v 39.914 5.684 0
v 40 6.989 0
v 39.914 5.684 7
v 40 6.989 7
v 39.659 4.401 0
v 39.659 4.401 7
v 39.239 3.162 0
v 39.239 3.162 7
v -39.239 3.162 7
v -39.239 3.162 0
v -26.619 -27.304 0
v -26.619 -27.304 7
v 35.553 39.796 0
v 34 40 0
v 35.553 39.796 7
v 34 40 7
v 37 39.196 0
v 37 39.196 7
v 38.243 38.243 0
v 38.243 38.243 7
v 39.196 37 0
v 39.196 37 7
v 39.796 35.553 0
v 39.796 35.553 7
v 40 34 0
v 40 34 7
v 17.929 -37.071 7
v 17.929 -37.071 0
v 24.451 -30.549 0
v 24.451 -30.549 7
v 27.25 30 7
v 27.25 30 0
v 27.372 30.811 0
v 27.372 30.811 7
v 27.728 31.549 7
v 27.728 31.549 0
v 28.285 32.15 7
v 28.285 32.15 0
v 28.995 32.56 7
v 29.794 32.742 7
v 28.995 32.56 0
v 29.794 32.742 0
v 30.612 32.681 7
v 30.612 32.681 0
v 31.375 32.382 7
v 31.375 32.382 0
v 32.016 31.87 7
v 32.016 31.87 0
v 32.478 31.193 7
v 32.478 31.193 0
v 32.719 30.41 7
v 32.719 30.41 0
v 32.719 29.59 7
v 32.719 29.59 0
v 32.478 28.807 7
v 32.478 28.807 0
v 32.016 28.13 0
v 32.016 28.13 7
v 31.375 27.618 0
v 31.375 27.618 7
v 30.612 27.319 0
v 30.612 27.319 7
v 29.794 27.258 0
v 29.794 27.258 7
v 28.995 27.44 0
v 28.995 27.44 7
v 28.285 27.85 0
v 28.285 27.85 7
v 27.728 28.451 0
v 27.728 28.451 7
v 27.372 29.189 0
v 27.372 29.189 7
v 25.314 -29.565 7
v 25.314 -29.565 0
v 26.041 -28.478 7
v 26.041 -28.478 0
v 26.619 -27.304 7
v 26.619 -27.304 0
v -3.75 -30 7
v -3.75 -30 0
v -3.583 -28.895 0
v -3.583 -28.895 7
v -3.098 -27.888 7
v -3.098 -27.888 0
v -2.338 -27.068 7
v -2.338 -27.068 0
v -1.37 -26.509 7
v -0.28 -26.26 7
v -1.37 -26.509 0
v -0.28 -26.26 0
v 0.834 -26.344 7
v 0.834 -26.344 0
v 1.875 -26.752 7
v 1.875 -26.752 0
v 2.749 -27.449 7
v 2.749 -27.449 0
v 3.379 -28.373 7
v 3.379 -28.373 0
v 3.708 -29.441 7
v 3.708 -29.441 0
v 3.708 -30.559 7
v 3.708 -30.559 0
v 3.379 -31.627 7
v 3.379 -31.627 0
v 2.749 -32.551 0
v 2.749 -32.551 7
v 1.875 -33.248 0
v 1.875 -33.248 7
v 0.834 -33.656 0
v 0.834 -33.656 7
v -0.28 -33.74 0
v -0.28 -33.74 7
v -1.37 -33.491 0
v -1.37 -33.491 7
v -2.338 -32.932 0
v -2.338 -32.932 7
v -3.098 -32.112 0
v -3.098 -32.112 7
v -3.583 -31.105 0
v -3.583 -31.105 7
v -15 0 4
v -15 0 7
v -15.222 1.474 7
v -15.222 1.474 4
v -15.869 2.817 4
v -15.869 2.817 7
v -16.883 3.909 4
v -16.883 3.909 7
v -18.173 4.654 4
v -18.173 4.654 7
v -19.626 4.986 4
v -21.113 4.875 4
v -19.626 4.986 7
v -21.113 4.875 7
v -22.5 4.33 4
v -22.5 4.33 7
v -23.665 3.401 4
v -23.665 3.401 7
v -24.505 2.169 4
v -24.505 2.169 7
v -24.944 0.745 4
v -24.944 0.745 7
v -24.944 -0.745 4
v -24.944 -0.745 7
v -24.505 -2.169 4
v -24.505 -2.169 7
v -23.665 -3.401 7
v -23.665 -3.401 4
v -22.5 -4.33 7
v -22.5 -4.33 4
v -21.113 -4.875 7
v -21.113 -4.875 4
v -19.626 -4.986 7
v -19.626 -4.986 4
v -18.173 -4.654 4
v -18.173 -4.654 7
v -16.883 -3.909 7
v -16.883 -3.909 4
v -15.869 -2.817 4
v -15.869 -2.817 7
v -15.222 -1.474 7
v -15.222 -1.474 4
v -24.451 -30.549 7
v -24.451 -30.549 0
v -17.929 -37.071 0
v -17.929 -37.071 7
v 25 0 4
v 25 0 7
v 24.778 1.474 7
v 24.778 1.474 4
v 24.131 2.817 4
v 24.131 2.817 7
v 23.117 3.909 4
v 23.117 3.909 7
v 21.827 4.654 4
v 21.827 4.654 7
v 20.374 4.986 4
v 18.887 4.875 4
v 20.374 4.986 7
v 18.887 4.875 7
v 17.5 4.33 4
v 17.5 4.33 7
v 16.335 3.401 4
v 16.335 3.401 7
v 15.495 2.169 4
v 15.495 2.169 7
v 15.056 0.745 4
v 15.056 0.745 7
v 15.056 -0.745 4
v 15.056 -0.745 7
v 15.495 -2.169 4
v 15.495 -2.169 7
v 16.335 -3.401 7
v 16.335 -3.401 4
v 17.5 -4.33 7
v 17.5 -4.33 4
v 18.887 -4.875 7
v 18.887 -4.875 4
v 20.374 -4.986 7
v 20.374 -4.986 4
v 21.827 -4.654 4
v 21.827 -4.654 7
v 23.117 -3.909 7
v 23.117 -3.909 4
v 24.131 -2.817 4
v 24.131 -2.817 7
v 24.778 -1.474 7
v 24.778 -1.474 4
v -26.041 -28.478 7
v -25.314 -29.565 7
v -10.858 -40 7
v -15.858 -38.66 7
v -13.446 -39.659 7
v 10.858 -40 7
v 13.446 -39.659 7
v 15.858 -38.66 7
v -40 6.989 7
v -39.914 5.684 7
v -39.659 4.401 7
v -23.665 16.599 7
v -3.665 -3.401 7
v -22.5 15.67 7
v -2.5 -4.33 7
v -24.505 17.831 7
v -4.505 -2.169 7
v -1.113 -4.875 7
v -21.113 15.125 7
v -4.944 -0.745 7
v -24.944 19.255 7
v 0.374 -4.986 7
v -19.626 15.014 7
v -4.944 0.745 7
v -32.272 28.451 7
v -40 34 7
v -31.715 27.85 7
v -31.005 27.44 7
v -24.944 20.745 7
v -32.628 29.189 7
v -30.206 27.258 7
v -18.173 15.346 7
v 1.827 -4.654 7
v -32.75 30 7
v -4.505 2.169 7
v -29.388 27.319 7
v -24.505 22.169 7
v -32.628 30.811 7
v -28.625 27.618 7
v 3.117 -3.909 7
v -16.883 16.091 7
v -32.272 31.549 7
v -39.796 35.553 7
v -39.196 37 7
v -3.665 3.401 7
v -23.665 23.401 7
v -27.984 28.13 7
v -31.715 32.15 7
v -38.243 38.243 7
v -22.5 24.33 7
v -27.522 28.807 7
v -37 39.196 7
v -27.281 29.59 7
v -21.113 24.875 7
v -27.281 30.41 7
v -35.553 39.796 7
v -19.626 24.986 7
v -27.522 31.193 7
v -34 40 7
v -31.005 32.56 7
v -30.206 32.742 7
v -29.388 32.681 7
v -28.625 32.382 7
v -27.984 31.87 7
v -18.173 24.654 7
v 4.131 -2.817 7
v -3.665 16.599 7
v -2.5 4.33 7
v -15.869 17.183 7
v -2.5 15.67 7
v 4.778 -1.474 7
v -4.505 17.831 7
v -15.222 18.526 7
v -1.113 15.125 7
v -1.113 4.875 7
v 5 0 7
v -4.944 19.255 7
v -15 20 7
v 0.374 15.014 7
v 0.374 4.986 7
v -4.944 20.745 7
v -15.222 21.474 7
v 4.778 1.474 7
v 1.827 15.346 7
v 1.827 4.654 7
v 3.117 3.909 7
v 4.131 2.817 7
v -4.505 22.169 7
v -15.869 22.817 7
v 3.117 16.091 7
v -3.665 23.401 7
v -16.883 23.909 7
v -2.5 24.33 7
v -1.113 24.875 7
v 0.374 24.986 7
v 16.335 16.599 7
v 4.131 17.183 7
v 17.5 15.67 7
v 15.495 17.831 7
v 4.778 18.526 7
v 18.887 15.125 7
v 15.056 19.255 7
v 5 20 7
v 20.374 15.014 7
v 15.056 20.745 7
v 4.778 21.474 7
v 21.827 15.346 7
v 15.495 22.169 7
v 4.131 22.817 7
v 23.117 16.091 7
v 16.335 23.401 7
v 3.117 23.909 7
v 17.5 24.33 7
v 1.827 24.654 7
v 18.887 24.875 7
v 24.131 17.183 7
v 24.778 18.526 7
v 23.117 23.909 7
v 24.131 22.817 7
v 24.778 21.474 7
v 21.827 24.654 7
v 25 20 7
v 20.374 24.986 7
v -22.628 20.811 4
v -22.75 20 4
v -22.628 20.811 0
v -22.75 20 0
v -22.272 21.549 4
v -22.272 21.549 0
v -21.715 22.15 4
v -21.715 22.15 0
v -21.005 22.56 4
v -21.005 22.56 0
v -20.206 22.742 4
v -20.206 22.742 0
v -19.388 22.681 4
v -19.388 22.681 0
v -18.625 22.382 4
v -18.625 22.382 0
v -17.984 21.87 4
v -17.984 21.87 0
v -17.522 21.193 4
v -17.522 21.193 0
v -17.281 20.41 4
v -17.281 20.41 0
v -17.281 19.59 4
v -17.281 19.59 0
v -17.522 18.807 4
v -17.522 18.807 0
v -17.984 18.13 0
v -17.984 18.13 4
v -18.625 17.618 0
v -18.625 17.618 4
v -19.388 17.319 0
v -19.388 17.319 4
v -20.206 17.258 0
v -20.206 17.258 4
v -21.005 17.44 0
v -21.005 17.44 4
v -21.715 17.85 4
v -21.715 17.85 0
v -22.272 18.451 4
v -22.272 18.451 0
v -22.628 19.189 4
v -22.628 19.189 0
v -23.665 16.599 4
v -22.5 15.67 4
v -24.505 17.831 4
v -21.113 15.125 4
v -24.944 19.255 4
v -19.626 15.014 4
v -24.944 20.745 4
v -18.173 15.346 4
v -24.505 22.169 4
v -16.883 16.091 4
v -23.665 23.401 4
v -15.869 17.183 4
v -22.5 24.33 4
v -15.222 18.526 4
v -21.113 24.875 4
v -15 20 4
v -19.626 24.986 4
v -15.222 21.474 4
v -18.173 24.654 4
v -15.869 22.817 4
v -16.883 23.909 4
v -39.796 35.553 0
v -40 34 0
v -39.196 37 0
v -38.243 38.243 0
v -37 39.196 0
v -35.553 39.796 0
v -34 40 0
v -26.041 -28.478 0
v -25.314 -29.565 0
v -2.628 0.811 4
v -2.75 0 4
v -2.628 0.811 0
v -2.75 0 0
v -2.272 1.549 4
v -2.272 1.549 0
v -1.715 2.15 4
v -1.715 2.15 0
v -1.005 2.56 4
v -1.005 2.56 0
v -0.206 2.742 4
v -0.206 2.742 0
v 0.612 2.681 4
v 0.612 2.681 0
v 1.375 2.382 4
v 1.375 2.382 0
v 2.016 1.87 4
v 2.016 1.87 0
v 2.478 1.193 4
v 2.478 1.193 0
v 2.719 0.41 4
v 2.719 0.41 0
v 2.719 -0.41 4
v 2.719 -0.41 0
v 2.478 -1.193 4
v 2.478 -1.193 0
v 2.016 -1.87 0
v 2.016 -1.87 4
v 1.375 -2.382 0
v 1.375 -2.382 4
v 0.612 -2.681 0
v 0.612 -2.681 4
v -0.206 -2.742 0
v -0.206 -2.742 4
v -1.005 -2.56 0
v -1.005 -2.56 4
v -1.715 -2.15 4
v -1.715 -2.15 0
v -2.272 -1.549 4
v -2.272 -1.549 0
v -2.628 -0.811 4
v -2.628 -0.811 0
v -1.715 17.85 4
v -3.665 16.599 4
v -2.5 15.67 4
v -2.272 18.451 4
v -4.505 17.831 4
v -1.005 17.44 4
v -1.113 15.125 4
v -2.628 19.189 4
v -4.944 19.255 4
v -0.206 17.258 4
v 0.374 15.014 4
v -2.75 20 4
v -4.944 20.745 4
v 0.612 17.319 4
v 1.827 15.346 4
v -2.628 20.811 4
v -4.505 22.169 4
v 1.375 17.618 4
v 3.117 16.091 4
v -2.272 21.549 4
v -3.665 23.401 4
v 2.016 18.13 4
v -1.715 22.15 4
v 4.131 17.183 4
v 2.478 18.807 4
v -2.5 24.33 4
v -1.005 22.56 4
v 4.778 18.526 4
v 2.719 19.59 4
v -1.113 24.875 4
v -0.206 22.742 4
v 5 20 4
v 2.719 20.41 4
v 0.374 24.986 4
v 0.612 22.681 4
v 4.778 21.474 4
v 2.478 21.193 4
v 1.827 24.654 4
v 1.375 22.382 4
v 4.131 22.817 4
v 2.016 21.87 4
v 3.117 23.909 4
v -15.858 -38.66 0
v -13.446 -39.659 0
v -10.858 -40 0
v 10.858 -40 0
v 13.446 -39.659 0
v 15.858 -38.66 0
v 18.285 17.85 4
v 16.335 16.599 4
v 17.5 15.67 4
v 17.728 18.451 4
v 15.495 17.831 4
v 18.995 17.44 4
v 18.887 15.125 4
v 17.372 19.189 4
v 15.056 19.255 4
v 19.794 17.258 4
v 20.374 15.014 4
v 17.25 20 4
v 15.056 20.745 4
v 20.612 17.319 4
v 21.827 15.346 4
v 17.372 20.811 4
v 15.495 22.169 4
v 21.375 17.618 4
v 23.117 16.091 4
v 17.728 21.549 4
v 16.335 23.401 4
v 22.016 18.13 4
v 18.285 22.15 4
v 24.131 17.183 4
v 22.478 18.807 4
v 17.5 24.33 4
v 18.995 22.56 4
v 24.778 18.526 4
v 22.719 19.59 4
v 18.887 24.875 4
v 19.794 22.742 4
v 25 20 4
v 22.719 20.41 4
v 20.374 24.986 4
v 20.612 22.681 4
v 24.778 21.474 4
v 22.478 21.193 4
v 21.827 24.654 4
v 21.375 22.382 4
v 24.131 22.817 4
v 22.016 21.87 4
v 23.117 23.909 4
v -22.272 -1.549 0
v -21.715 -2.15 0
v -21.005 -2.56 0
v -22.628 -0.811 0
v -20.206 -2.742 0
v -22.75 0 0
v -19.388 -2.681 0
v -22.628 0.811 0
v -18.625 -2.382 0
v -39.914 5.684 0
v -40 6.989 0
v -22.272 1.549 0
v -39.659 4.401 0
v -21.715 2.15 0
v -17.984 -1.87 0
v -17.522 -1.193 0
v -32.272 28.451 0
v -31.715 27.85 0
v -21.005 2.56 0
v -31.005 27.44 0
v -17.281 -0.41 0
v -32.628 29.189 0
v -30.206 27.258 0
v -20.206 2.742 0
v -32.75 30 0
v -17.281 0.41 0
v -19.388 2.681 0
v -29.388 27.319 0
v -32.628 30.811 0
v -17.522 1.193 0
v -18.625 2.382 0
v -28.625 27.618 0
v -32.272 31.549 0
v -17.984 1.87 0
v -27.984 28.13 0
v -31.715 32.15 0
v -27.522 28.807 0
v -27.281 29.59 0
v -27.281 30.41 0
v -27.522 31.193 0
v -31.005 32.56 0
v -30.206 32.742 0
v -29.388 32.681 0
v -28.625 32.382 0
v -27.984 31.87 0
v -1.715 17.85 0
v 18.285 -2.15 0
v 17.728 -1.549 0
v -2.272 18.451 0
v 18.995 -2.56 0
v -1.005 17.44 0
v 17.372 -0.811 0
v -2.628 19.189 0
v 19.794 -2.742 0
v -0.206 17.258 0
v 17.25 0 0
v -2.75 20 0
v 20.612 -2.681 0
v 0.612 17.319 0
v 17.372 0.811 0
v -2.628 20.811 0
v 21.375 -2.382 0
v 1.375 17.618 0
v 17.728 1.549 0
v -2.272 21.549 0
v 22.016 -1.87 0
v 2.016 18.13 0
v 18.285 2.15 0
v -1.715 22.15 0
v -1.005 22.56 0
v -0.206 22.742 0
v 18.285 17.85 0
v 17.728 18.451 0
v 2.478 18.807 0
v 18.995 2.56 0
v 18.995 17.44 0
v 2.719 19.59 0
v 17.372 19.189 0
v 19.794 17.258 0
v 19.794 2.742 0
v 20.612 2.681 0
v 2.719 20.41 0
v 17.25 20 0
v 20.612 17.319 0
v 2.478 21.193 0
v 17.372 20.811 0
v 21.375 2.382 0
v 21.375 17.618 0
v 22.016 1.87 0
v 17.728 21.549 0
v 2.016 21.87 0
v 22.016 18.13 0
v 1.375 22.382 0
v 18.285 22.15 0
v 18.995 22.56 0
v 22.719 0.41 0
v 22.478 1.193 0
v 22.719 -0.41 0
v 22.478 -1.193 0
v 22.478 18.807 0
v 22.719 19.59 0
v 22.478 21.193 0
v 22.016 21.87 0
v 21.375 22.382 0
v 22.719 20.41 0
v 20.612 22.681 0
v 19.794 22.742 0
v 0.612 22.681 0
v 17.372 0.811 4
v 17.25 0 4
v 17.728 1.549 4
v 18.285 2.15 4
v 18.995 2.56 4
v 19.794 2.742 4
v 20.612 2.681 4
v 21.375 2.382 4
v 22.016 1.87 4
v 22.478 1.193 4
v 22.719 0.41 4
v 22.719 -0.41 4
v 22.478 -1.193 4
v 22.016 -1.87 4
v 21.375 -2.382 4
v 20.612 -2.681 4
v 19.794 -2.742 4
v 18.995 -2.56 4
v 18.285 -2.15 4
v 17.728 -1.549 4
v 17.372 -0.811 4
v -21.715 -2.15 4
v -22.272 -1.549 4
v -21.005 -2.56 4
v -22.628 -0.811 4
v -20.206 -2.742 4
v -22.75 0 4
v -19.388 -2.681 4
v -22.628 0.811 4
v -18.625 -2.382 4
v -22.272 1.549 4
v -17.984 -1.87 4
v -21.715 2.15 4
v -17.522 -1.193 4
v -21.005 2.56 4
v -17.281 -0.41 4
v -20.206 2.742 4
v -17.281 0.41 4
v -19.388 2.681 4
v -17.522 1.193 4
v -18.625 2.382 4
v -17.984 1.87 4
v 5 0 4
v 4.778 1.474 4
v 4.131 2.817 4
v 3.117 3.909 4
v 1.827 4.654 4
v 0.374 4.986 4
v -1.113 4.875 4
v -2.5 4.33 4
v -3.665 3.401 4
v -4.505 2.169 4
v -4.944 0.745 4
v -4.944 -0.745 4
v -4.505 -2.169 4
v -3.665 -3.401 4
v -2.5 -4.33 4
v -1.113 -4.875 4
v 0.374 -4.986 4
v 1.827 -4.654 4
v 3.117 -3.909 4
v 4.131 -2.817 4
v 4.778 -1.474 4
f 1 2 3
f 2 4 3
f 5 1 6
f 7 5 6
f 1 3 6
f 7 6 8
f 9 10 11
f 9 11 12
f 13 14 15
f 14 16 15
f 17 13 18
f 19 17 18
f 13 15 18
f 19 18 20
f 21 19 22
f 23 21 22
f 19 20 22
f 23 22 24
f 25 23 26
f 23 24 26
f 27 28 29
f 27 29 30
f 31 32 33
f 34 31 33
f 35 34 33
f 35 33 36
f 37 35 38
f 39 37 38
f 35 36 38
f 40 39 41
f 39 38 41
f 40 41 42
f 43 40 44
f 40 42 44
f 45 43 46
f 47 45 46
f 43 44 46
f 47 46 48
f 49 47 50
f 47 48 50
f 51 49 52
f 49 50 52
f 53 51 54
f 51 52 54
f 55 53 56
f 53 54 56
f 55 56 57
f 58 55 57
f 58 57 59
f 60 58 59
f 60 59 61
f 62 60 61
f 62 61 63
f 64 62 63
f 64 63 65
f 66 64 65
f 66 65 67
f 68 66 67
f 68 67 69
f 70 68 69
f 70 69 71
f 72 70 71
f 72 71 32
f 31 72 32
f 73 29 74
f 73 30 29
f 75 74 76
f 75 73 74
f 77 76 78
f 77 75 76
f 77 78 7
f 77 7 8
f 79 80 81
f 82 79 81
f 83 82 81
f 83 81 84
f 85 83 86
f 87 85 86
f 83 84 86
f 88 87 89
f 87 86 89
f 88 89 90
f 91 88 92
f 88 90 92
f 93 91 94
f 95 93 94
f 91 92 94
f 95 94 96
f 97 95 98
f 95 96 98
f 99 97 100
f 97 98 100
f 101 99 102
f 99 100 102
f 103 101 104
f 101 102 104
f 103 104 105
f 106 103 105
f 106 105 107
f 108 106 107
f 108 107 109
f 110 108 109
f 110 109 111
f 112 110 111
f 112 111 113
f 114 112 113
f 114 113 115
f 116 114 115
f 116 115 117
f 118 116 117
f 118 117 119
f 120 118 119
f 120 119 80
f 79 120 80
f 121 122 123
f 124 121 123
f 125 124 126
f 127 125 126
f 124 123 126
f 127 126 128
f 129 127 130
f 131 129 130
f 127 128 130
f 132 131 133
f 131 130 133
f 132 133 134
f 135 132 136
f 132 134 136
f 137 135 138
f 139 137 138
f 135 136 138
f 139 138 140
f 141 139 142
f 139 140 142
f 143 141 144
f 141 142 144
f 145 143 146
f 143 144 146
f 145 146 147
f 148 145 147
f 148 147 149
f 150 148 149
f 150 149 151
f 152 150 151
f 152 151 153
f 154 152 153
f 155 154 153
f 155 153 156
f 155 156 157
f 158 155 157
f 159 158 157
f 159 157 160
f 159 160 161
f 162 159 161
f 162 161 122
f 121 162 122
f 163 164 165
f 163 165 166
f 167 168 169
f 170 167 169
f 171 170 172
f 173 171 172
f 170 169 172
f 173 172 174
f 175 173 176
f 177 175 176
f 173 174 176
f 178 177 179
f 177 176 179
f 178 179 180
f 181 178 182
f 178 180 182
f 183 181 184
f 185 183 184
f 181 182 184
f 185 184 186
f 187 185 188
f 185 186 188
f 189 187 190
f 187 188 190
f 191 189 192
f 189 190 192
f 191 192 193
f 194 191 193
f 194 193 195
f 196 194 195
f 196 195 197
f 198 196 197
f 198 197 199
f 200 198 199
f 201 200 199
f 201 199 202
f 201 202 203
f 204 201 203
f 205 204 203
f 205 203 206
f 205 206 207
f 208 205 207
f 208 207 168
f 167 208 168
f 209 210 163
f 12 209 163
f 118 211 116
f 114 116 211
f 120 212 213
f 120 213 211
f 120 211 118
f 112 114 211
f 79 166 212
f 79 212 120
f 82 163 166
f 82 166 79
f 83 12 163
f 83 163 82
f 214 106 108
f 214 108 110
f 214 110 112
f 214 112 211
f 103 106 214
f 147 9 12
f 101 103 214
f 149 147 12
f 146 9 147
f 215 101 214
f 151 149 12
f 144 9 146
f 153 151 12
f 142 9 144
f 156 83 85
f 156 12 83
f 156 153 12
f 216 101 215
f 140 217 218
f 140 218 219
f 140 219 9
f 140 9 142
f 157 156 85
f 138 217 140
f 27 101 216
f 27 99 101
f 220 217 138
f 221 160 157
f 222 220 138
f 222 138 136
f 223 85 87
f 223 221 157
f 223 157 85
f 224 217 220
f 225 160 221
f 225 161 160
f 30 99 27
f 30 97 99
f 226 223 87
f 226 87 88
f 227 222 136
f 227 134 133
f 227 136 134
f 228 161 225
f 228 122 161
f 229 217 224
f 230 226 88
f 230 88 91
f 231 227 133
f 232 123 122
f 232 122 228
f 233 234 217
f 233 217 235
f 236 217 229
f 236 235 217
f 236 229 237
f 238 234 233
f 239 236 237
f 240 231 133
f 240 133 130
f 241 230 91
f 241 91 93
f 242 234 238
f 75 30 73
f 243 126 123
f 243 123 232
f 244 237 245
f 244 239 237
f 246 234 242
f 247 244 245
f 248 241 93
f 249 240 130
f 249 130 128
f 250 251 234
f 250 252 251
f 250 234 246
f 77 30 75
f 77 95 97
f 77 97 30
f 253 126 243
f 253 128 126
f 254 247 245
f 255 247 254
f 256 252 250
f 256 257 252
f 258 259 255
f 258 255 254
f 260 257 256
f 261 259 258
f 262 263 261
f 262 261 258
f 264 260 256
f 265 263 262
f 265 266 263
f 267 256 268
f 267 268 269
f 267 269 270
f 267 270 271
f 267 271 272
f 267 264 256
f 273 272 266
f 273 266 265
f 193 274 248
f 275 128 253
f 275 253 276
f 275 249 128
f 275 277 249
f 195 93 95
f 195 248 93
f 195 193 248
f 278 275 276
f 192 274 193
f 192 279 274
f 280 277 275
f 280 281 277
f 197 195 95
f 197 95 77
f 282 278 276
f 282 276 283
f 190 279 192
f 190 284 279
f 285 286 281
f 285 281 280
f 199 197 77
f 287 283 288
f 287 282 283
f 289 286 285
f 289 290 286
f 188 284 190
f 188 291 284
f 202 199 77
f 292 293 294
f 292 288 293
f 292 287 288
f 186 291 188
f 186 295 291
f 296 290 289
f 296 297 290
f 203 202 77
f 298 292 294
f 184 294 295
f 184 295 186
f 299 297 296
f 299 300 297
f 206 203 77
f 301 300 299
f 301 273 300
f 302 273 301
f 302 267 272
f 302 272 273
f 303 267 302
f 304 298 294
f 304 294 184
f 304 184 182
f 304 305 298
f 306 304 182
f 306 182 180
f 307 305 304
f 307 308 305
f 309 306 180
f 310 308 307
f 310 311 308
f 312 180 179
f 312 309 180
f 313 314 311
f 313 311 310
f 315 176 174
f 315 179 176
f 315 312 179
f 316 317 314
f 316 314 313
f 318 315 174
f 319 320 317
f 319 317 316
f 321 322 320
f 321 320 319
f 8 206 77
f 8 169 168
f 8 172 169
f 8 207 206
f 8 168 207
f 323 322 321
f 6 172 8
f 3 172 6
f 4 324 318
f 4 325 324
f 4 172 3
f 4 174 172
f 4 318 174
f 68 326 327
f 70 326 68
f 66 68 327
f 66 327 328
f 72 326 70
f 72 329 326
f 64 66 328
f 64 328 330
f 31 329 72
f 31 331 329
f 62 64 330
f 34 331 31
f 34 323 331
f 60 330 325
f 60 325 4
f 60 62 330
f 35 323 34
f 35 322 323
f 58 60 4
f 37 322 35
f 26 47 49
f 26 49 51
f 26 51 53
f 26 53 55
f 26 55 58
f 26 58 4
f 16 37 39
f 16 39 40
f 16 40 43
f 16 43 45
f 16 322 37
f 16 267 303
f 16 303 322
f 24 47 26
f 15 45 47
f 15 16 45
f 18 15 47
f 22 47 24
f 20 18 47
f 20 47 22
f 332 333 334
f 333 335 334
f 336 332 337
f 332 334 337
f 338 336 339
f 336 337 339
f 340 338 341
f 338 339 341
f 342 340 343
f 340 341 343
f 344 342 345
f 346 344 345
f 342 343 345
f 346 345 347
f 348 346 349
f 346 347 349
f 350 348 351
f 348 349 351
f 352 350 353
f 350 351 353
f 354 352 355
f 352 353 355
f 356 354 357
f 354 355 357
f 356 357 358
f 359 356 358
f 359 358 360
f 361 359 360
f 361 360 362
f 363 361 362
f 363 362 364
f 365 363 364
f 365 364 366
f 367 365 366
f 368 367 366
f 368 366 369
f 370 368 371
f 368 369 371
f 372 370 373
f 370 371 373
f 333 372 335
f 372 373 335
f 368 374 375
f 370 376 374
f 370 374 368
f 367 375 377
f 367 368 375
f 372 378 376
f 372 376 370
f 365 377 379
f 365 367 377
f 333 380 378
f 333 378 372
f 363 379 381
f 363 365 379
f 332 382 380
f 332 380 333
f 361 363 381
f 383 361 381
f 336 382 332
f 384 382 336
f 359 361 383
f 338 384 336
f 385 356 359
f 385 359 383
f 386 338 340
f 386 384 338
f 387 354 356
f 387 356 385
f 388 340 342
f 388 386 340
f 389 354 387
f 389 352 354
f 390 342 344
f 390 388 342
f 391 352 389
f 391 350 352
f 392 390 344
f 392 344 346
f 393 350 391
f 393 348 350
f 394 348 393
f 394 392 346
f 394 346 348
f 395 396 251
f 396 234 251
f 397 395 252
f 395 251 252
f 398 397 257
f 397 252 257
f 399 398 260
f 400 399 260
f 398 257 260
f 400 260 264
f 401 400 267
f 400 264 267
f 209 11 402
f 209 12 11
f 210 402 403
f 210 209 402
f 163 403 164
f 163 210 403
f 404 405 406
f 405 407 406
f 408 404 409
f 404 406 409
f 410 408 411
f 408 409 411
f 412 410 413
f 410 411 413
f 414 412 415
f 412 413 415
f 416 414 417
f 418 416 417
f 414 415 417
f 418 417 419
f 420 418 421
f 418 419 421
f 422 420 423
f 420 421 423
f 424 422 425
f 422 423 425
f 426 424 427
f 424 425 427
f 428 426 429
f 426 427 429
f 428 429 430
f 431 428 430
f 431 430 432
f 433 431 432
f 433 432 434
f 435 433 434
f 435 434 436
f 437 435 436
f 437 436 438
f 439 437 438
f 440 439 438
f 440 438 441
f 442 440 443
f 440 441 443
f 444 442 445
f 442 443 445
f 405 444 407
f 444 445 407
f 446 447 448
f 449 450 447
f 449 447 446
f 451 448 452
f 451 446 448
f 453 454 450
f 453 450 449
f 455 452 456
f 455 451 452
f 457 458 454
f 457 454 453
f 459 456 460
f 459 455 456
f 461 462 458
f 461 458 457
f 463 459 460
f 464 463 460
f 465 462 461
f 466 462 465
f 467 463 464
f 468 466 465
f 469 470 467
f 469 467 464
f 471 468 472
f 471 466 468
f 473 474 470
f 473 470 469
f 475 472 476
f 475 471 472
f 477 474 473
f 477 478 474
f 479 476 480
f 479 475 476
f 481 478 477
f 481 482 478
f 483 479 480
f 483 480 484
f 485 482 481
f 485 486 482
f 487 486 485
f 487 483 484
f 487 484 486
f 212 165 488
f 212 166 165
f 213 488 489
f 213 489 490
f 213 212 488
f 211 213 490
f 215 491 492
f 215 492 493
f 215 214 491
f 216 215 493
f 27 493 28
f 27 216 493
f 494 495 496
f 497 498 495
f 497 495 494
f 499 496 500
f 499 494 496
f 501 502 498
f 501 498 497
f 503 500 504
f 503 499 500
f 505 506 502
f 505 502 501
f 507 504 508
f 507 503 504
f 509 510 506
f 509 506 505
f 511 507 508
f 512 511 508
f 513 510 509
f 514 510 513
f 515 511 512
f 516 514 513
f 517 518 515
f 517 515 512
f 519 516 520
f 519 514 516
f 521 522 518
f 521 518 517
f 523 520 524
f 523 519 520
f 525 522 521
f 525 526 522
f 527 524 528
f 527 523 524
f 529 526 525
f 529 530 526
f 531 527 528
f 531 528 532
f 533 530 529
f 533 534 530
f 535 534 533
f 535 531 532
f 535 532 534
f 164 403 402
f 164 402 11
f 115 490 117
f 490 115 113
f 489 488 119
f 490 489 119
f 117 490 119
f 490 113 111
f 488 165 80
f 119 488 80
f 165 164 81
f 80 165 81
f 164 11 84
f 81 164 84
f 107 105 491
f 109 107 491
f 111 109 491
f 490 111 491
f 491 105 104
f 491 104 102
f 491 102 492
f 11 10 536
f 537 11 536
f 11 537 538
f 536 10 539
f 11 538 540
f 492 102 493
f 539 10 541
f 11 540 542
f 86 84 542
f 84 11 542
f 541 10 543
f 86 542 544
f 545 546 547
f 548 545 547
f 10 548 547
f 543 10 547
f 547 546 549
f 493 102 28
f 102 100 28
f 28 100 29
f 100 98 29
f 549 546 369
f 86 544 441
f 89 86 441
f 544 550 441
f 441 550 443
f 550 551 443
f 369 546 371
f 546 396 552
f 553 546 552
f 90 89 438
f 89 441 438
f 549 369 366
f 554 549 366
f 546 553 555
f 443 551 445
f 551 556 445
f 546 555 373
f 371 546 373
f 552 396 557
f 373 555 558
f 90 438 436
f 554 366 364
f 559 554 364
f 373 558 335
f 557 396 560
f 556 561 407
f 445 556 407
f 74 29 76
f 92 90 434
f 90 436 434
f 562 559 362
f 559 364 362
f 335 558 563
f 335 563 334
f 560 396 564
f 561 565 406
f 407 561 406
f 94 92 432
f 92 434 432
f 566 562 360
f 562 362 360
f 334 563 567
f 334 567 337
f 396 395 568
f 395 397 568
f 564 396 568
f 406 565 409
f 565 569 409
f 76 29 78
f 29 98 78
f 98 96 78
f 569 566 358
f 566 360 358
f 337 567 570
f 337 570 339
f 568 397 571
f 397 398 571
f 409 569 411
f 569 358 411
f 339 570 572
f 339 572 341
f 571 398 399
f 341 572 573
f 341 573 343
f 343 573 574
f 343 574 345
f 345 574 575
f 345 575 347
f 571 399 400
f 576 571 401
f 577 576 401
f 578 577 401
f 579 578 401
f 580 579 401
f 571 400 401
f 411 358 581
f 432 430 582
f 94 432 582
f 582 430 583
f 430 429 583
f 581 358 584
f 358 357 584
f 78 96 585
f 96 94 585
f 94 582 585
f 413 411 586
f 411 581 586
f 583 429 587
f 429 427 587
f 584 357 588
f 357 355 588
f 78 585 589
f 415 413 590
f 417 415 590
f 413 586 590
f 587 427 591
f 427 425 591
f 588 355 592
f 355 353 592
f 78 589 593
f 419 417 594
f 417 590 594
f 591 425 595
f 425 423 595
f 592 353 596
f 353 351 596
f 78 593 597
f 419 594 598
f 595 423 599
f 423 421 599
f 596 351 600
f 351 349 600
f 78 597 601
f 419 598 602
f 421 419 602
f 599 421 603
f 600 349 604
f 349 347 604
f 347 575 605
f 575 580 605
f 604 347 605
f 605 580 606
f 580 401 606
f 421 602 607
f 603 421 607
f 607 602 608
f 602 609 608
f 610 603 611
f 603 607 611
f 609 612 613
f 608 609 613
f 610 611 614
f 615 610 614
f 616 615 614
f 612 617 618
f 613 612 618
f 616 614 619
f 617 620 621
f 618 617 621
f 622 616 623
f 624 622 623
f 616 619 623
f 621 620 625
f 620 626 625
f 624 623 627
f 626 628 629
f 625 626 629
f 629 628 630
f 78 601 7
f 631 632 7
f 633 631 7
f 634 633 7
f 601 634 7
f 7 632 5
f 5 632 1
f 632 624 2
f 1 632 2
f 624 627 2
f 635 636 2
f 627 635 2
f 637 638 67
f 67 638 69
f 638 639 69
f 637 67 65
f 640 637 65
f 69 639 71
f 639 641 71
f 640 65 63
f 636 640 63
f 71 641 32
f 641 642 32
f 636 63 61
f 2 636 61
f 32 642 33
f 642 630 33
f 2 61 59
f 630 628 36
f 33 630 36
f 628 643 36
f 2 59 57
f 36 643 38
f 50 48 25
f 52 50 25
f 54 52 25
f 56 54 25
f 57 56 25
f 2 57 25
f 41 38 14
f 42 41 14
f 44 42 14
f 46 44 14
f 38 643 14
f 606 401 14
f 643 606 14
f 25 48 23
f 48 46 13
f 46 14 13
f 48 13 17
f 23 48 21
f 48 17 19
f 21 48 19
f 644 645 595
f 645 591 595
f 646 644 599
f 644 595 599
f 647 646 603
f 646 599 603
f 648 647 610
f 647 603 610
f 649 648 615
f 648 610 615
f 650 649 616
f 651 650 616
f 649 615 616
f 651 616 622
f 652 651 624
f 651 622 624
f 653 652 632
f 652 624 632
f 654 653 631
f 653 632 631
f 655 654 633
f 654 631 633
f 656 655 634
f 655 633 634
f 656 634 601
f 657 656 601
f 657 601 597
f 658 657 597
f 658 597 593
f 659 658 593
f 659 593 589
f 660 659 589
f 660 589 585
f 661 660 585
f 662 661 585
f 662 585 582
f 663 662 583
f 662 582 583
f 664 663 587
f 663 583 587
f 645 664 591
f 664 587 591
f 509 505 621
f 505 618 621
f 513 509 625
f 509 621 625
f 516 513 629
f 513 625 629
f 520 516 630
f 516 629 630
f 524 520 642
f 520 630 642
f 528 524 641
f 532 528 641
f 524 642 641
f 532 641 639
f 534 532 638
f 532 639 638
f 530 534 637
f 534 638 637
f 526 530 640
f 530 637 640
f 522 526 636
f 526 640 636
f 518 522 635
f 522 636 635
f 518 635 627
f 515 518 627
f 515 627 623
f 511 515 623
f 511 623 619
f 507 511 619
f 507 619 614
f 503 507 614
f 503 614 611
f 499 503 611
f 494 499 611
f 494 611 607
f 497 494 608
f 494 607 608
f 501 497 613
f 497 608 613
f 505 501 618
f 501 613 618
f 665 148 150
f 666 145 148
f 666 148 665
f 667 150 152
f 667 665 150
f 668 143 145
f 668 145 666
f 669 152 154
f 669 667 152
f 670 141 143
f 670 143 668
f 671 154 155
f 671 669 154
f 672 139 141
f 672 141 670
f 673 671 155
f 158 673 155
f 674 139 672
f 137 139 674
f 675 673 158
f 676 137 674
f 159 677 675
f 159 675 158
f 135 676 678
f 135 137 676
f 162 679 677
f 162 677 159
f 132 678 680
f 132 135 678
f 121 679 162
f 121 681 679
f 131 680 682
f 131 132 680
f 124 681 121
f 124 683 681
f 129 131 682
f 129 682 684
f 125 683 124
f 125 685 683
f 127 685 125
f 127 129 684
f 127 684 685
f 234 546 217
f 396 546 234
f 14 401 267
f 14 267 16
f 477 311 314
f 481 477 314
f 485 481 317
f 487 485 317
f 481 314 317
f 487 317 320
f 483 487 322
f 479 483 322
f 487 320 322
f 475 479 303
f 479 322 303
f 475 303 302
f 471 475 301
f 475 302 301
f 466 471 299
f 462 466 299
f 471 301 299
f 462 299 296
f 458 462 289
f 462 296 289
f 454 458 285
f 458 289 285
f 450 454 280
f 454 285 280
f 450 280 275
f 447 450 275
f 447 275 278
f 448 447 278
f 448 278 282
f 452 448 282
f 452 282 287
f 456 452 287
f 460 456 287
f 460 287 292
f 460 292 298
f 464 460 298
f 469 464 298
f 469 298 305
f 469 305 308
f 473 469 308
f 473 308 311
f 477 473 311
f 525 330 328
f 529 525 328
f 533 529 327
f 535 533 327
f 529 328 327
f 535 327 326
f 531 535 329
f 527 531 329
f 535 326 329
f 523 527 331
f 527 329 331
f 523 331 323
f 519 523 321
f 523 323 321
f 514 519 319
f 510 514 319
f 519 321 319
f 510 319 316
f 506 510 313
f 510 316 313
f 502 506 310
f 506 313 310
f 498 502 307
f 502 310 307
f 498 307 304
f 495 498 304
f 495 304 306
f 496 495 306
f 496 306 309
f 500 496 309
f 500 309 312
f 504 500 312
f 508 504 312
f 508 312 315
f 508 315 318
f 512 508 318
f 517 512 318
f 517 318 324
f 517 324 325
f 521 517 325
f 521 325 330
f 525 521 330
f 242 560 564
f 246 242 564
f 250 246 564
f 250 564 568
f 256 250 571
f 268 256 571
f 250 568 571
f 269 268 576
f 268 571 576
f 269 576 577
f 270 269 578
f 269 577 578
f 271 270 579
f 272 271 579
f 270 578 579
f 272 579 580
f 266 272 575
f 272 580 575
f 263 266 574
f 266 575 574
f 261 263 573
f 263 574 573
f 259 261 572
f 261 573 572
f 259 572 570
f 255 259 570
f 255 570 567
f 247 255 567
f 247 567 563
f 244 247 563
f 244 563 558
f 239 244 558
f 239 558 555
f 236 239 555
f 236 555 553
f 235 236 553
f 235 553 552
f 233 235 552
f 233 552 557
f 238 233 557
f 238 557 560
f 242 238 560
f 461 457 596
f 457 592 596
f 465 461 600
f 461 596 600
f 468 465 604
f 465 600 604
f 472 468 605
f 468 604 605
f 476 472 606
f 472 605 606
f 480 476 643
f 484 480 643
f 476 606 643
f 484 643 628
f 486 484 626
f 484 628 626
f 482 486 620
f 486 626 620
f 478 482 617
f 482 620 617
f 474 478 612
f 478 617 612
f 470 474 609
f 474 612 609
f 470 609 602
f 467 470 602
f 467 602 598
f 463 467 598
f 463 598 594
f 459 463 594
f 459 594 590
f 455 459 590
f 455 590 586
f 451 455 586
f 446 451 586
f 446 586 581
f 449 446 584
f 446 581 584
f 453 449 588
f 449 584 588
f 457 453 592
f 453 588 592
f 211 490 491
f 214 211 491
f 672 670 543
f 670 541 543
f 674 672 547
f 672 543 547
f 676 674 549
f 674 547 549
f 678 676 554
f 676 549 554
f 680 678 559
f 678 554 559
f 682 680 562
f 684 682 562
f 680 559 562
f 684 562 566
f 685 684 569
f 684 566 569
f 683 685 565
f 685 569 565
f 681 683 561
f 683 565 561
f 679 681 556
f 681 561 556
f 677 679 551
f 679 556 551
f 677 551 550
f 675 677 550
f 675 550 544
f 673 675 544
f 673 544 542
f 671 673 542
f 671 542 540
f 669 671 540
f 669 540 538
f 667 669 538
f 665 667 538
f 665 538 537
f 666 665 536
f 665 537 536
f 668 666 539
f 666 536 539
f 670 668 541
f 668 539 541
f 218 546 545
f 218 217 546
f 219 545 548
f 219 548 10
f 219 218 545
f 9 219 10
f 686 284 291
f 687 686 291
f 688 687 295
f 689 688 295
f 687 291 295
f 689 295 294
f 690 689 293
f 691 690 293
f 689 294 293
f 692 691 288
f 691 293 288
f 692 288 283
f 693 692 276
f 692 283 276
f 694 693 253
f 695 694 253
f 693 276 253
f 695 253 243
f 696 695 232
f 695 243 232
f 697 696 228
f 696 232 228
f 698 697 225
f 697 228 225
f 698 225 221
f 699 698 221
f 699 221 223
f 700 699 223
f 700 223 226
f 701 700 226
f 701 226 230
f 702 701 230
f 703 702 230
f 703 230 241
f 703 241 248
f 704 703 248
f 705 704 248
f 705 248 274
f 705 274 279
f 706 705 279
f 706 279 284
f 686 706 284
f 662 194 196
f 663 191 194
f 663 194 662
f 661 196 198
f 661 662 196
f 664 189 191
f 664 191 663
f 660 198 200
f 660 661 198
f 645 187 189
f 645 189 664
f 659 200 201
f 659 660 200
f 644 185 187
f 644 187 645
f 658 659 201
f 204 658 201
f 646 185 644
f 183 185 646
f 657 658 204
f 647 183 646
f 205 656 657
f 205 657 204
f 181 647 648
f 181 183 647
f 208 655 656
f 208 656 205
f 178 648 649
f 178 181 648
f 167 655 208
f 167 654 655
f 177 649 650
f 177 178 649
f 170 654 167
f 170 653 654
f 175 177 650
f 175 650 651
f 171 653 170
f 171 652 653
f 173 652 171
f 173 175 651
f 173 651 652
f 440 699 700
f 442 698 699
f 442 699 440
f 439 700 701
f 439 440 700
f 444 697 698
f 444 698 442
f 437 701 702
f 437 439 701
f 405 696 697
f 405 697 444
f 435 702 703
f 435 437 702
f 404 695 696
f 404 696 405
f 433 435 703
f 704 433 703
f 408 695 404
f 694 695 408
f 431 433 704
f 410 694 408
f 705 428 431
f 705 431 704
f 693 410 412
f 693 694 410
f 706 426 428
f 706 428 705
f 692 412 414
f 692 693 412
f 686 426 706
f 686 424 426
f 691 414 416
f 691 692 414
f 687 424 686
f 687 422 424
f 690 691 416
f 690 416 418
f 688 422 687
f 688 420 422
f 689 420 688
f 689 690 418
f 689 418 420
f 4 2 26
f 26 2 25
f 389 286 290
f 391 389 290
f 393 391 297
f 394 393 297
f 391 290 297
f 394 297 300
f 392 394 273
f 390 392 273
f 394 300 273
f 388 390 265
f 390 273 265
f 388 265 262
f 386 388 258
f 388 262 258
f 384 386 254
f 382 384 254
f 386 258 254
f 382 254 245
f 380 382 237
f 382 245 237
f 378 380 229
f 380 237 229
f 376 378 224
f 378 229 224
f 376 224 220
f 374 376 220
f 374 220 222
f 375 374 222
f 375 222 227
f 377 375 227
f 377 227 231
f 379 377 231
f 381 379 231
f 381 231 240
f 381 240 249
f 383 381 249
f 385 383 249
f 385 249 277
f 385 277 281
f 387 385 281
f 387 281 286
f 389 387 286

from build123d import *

# Parameters (mm, degrees)
F0_W           = 80
F0_H           = 80
F1_DEPTH       = 7
F3_D           = 7.5
F4_R           = 6
F5_SIZE        = 25
F6_SIZE        = 20
F8_D           = 5.5
F8_CBORE_D     = 10
F8_CBORE_DEPTH = 3
F9_R           = 10
F10_D          = 5.5


with BuildPart() as f1:
    # F0 (on Top) → F1 (new body)
    with BuildSketch(Plane.XY):
        Rectangle(F0_W, F0_H)
    extrude(amount=F1_DEPTH)

    # F3 (through all)
    with Locations(Plane.XY.offset(7)):
        with Locations((0, -30)):
            Hole(F3_D / 2)

    # F4
    f4_edges = [f1.edges().sort_by_distance(p)[0] for p in [
        (-40, 40, 3.5),
        (40, 40, 3.5),
    ]]
    fillet(f4_edges, radius=F4_R)

    # F5
    f5_edges = [f1.edges().sort_by_distance(p)[0] for p in [
        (-40, -40, 3.5),
        (40, -40, 3.5),
    ]]
    chamfer(f5_edges, length=F5_SIZE)

    # F6
    f6_edges = [f1.edges().sort_by_distance(p)[0] for p in [
        (40, -15, 3.5),
        (-40, -15, 3.5),
    ]]
    chamfer(f6_edges, length=F6_SIZE)

    # F8 (through all)
    with Locations(Plane.XY.offset(7)):
        with Locations((-20, 20), (0, 20), (20, 20), (20, 0), (0, 0), (-20, 0)):
            CounterBoreHole(F8_D / 2, F8_CBORE_D / 2, F8_CBORE_DEPTH)

    # F9
    f9_edges = [f1.edges().sort_by_distance(p)[0] for p in [
        (40, 5, 3.5),
        (25.857864, -29.142136, 3.5),
        (15, -40, 3.5),
        (-15, -40, 3.5),
        (-40, 5, 3.5),
        (-25.857864, -29.142136, 3.5),
    ]]
    fillet(f9_edges, radius=F9_R)

    # F10 (through all)
    with Locations(Plane.XY.offset(7)):
        with Locations((-30, 30), (30, 30)):
            Hole(F10_D / 2)


solid = f1.part
